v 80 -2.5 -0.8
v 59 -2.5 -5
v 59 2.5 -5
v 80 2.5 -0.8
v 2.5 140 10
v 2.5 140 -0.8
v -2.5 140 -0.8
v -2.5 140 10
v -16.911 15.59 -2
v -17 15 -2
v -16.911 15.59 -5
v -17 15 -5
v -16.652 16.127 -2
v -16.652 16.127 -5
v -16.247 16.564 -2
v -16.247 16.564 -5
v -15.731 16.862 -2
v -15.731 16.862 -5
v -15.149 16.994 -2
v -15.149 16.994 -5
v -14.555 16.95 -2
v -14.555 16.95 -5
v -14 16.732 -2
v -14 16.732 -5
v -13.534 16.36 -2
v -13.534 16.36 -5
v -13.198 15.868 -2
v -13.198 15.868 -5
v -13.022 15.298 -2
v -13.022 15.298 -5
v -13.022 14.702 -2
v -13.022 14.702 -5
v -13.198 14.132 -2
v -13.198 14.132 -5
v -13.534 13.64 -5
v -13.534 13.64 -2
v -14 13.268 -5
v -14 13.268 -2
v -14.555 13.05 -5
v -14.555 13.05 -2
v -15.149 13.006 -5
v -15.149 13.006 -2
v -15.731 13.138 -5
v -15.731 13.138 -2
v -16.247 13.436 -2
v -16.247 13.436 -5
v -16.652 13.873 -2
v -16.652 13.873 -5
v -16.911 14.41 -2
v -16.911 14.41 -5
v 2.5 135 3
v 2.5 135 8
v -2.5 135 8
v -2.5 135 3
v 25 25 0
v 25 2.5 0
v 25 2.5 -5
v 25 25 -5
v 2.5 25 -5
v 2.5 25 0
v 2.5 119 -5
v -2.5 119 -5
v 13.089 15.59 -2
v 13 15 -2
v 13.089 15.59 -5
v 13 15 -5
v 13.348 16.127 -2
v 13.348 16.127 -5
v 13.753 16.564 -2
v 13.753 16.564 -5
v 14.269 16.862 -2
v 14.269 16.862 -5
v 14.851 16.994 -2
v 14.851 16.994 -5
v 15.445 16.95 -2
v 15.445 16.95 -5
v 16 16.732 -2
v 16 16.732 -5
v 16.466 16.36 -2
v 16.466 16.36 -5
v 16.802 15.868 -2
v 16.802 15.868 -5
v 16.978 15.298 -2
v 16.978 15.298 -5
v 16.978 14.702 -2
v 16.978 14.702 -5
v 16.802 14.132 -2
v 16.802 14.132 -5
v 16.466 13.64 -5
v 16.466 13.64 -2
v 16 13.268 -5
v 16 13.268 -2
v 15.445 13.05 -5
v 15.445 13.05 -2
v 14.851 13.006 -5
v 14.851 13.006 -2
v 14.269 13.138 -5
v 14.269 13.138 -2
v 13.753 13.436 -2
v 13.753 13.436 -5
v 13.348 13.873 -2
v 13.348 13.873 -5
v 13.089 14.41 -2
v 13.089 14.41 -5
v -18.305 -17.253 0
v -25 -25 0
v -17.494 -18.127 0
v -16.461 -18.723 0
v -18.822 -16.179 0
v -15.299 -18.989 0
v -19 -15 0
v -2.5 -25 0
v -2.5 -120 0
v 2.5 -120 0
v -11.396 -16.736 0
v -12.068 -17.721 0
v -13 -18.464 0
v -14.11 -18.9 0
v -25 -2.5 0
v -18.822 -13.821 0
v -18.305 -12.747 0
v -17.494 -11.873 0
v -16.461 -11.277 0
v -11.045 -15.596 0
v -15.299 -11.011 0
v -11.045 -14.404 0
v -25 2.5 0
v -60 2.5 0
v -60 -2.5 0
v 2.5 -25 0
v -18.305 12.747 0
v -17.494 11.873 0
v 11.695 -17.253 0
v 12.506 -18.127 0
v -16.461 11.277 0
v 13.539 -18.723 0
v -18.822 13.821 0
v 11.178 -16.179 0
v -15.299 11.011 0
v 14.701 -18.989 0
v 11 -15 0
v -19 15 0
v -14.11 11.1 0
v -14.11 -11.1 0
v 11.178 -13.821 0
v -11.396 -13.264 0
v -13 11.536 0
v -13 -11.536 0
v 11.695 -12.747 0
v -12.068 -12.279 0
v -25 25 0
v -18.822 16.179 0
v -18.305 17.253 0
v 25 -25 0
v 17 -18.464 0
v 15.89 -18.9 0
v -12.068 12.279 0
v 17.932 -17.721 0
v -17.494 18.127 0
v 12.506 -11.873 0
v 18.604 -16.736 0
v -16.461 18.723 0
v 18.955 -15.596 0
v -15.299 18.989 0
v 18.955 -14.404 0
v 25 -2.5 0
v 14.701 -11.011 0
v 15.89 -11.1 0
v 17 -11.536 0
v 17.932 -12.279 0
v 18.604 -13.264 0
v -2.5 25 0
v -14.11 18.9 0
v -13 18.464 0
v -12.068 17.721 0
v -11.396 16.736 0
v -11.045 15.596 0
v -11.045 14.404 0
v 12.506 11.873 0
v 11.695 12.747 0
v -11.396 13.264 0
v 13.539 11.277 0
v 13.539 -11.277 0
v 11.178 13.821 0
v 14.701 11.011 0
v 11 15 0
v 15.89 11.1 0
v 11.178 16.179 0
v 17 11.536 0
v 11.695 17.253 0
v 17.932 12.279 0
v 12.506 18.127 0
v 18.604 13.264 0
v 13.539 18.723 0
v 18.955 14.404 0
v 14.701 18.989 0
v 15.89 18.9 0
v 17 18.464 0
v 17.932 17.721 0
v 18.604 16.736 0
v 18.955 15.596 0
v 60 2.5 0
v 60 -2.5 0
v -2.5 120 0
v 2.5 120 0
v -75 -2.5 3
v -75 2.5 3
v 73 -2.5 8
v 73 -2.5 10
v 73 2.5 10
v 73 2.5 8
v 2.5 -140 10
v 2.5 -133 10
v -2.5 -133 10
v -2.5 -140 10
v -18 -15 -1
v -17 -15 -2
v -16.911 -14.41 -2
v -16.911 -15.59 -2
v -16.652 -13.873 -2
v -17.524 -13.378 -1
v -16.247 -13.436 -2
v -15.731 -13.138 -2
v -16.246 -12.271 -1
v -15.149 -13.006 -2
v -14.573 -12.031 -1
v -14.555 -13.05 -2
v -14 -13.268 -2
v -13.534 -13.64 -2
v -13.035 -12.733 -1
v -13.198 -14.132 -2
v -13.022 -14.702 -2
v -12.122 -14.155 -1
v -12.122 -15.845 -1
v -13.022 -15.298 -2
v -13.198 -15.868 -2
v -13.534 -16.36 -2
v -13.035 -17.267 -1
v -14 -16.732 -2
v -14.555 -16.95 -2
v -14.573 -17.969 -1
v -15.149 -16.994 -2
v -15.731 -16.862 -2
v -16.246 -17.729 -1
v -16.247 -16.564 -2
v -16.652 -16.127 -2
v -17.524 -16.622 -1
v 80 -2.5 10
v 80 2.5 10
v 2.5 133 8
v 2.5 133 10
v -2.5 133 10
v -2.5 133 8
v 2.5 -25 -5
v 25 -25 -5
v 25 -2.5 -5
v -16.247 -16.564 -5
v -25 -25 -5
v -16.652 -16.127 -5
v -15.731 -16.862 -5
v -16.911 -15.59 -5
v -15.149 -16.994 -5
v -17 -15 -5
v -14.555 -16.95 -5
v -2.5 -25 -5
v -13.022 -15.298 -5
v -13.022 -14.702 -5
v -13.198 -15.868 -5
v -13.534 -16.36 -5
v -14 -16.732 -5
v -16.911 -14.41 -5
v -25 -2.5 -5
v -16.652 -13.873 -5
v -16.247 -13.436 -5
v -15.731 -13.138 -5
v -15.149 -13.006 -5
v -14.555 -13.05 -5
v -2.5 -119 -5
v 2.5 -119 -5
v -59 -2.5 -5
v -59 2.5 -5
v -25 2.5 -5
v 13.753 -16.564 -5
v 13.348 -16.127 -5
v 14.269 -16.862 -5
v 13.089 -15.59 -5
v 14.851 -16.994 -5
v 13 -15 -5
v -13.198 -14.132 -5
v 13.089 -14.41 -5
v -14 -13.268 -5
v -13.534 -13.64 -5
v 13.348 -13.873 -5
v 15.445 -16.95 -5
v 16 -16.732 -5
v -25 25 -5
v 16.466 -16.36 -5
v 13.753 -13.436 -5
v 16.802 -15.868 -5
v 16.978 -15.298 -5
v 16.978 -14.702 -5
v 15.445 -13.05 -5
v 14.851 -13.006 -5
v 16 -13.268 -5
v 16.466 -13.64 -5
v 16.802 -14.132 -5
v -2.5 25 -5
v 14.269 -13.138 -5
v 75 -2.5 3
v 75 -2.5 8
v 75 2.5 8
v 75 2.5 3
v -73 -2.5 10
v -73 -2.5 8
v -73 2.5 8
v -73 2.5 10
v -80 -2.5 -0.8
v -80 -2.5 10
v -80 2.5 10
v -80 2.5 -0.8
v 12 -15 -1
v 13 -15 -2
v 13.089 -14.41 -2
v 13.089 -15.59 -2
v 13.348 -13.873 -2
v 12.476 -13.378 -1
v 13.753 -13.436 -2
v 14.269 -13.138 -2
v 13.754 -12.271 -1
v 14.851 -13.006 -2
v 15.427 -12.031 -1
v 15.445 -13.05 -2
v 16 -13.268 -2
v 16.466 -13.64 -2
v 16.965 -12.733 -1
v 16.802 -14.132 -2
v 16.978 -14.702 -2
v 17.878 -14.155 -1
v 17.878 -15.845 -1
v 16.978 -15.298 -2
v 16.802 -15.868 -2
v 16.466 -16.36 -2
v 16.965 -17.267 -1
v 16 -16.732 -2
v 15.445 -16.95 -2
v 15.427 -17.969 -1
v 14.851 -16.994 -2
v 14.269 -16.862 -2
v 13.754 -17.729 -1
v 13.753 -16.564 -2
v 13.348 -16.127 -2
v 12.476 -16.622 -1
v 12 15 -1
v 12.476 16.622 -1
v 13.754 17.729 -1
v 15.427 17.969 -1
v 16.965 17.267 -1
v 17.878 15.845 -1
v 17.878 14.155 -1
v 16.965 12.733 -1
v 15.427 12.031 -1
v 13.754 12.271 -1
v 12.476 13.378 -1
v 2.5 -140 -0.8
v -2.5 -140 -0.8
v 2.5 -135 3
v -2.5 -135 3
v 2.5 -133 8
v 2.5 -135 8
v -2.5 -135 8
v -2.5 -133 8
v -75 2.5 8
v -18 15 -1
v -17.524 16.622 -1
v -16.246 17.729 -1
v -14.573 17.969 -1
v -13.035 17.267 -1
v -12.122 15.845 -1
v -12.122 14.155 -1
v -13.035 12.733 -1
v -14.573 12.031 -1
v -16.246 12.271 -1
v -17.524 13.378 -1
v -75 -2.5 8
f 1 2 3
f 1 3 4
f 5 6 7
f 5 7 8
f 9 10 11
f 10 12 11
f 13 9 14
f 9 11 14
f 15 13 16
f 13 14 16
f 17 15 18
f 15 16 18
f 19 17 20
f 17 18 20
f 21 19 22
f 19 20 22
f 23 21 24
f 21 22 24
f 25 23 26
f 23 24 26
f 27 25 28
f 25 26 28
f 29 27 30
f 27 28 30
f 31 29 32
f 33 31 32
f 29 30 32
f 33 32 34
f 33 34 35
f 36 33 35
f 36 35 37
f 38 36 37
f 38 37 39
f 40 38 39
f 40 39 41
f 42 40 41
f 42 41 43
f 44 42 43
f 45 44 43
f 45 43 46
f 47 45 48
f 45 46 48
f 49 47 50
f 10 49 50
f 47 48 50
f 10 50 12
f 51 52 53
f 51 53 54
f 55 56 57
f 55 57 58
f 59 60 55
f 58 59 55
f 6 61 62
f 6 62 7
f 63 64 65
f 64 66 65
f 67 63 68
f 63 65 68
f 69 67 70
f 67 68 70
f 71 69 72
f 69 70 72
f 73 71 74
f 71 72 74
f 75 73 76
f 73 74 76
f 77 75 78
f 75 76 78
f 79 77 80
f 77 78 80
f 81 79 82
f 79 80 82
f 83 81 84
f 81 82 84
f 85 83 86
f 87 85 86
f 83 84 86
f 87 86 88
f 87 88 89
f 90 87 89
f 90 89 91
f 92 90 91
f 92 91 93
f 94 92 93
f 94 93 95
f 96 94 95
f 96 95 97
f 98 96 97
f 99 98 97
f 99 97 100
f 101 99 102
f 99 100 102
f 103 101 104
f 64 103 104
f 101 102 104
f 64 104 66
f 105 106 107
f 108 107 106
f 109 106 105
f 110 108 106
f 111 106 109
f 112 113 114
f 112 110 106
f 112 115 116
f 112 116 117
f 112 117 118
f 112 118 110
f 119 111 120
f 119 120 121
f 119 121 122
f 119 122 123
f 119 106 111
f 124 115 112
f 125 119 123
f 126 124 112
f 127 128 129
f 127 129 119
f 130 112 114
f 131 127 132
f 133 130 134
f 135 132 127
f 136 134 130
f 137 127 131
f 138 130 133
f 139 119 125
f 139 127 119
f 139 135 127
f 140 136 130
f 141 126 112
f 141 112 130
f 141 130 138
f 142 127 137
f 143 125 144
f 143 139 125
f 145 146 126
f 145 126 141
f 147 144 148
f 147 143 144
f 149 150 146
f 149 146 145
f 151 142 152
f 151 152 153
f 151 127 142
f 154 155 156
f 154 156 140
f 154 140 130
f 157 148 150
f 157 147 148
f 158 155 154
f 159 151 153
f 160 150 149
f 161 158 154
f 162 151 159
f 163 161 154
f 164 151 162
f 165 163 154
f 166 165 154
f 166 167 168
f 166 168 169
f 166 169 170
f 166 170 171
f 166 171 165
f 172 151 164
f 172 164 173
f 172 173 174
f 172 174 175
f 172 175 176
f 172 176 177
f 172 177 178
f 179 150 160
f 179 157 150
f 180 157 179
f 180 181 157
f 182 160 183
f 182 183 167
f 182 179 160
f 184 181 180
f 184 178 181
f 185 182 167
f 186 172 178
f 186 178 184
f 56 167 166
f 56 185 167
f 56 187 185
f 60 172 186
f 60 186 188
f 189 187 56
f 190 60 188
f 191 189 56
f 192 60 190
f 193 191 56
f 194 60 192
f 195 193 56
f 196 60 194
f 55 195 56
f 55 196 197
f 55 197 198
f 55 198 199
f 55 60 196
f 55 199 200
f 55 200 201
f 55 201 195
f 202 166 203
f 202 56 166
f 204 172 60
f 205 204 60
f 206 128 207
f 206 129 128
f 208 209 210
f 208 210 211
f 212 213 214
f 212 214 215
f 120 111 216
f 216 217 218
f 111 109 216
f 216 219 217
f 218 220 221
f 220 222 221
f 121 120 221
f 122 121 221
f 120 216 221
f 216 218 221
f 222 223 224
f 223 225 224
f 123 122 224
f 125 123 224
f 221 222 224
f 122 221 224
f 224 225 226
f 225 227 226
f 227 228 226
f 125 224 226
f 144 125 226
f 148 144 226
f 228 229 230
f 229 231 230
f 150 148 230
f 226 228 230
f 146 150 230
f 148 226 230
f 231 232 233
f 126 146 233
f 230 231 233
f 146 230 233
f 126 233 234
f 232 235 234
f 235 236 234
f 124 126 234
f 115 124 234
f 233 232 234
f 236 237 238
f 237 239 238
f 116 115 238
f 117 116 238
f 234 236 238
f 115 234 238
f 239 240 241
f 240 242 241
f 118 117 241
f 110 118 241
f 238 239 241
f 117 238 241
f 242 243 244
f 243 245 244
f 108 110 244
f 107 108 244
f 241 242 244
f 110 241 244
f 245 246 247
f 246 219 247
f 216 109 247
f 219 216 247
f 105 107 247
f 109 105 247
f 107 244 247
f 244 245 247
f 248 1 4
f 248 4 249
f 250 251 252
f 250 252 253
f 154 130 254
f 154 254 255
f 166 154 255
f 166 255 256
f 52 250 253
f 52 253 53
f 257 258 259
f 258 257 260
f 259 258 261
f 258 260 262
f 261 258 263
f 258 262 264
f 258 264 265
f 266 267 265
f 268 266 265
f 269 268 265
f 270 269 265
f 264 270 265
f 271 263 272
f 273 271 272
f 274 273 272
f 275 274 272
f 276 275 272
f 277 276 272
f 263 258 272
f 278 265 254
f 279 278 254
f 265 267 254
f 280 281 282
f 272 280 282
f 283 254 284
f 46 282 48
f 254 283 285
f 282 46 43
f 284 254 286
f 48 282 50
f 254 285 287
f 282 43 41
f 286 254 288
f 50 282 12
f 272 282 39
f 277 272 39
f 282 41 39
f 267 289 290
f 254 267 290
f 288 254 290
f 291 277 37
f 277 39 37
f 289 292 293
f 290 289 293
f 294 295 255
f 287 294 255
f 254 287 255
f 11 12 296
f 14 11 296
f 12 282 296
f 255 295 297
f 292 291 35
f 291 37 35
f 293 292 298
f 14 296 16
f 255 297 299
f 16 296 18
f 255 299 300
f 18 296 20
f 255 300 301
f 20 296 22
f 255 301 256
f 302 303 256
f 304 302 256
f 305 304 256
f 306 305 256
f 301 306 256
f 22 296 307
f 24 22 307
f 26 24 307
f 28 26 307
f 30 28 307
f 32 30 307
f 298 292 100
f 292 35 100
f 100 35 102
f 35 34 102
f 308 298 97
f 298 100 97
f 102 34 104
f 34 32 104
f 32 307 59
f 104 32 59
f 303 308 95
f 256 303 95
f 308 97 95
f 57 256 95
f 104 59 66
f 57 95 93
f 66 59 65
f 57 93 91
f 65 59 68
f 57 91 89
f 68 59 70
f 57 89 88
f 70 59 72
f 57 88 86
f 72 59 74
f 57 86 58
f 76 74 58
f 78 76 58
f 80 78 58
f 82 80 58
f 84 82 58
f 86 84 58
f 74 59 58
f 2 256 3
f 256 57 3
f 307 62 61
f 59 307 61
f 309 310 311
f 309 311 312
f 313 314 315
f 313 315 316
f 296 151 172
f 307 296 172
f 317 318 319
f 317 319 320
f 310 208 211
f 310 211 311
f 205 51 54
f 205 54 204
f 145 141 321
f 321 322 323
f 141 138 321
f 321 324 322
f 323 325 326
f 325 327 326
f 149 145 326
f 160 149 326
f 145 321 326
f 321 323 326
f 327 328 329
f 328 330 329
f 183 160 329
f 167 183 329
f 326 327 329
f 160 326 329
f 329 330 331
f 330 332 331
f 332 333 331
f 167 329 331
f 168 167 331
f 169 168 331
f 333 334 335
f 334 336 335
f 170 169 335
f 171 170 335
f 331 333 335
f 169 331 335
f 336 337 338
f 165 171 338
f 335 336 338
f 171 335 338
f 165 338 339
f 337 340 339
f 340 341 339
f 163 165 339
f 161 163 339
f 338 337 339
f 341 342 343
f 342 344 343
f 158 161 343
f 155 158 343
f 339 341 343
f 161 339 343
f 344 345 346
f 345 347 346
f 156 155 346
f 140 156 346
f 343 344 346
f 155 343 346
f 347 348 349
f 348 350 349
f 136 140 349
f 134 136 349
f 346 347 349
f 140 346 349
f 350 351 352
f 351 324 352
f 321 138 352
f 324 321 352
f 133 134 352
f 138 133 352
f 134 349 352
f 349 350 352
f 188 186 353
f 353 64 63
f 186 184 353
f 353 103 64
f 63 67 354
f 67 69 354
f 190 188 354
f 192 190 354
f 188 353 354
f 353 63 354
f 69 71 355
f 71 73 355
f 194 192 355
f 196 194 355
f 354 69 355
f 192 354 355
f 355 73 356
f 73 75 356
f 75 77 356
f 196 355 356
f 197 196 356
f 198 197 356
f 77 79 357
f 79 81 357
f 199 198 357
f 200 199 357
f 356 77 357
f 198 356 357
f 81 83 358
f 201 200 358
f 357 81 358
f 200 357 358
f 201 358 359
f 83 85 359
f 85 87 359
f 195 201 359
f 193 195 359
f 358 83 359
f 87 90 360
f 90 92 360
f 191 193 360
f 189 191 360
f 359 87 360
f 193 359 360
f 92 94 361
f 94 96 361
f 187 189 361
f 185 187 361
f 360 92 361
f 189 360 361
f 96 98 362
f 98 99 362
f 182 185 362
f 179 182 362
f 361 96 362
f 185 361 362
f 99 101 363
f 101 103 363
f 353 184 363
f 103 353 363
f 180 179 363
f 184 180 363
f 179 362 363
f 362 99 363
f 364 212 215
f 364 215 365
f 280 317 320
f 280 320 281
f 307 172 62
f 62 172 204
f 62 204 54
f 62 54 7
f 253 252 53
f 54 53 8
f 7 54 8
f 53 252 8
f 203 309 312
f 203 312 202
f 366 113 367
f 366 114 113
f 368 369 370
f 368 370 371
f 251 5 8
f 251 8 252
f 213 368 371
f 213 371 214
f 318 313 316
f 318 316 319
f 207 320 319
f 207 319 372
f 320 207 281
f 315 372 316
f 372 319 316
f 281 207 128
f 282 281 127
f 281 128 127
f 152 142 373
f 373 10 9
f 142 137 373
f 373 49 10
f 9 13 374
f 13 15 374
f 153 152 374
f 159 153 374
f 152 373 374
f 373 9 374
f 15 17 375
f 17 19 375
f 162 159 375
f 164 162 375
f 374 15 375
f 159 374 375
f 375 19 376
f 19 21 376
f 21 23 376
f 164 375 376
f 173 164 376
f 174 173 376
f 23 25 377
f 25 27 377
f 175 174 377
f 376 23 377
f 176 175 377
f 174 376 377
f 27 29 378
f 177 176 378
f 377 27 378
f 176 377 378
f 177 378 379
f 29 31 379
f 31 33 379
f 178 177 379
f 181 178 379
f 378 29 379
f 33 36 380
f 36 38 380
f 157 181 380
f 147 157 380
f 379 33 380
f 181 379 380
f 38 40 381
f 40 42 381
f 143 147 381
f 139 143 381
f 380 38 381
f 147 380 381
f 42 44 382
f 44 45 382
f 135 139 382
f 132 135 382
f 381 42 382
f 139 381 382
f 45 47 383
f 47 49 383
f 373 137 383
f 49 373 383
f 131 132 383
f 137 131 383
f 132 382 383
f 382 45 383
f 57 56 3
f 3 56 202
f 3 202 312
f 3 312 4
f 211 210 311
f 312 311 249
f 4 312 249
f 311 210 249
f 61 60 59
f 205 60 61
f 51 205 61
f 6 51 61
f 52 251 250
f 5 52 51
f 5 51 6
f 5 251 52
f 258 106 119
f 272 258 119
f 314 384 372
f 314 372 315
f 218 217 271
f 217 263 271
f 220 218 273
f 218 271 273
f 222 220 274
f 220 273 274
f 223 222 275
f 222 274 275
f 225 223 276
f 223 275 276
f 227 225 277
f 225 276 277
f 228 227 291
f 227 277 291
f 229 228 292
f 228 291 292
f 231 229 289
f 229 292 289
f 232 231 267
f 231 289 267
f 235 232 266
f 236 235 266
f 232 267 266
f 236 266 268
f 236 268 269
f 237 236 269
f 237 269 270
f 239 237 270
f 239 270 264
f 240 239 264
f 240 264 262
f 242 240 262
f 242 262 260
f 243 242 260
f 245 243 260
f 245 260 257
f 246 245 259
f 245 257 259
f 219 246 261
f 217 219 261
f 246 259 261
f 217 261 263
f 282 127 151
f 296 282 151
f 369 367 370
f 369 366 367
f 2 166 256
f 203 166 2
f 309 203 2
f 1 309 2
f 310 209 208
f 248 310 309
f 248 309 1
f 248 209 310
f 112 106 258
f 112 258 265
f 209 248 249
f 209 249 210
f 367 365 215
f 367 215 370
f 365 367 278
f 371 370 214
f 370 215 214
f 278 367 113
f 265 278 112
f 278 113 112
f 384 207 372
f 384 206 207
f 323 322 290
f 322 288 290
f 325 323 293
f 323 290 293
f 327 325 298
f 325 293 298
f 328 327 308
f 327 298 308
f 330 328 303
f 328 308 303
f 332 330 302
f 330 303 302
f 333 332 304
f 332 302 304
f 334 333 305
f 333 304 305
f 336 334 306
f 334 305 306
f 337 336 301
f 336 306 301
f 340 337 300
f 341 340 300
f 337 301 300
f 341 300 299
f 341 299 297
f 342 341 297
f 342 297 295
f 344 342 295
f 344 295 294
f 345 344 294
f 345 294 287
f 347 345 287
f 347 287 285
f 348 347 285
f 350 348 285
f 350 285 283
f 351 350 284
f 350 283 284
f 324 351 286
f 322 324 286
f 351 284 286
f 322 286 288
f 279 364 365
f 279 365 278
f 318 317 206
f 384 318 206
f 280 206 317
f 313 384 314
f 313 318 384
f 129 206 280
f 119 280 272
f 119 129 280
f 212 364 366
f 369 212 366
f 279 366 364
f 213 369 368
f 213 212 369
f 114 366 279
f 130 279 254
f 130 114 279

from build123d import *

# Parameters (mm, degrees)
F1_DEPTH       = 2.5
F3_DEPTH       = 2.5
F4_W           = 50
F4_H           = 50
F5_DEPTH       = 5
F7_D           = 4
F7_CSINK_D     = 8
F7_CSINK_ANGLE = 90


with BuildPart() as f1:
    # F0 (on Front) → F1 (new body, symmetric)
    with BuildSketch(Plane.XZ):
        Polygon((-75, 3), (-75, 8), (-73, 8), (-73, 10), (-80, 10), (-80, -0.8), (-59, -5), (59, -5), (80, -0.8), (80, 10), (73, 10), (73, 8), (75, 8), (75, 3), (60, 0), (-60, 0), align=None)
    extrude(amount=F1_DEPTH, both=True)

    # F2 (on Right) → F3 (join, symmetric)
    with BuildSketch(Plane.YZ):
        Polygon((-135, 3), (-135, 8), (-133, 8), (-133, 10), (-140, 10), (-140, -0.8), (-119, -5), (119, -5), (140, -0.8), (140, 10), (133, 10), (133, 8), (135, 8), (135, 3), (120, 0), (-120, 0), align=None)
    extrude(amount=F3_DEPTH, both=True)

    # F4 (on Top) → F5 (join)
    with BuildSketch(Plane.XY):
        Rectangle(F4_W, F4_H)
    extrude(amount=-F5_DEPTH)

    # F7 (through all)
    with Locations(Plane.XY):
        with Locations((15, -15), (-15, -15), (-15, 15), (15, 15)):
            CounterSinkHole(F7_D / 2, F7_CSINK_D / 2, counter_sink_angle=F7_CSINK_ANGLE)


solid = f1.part
